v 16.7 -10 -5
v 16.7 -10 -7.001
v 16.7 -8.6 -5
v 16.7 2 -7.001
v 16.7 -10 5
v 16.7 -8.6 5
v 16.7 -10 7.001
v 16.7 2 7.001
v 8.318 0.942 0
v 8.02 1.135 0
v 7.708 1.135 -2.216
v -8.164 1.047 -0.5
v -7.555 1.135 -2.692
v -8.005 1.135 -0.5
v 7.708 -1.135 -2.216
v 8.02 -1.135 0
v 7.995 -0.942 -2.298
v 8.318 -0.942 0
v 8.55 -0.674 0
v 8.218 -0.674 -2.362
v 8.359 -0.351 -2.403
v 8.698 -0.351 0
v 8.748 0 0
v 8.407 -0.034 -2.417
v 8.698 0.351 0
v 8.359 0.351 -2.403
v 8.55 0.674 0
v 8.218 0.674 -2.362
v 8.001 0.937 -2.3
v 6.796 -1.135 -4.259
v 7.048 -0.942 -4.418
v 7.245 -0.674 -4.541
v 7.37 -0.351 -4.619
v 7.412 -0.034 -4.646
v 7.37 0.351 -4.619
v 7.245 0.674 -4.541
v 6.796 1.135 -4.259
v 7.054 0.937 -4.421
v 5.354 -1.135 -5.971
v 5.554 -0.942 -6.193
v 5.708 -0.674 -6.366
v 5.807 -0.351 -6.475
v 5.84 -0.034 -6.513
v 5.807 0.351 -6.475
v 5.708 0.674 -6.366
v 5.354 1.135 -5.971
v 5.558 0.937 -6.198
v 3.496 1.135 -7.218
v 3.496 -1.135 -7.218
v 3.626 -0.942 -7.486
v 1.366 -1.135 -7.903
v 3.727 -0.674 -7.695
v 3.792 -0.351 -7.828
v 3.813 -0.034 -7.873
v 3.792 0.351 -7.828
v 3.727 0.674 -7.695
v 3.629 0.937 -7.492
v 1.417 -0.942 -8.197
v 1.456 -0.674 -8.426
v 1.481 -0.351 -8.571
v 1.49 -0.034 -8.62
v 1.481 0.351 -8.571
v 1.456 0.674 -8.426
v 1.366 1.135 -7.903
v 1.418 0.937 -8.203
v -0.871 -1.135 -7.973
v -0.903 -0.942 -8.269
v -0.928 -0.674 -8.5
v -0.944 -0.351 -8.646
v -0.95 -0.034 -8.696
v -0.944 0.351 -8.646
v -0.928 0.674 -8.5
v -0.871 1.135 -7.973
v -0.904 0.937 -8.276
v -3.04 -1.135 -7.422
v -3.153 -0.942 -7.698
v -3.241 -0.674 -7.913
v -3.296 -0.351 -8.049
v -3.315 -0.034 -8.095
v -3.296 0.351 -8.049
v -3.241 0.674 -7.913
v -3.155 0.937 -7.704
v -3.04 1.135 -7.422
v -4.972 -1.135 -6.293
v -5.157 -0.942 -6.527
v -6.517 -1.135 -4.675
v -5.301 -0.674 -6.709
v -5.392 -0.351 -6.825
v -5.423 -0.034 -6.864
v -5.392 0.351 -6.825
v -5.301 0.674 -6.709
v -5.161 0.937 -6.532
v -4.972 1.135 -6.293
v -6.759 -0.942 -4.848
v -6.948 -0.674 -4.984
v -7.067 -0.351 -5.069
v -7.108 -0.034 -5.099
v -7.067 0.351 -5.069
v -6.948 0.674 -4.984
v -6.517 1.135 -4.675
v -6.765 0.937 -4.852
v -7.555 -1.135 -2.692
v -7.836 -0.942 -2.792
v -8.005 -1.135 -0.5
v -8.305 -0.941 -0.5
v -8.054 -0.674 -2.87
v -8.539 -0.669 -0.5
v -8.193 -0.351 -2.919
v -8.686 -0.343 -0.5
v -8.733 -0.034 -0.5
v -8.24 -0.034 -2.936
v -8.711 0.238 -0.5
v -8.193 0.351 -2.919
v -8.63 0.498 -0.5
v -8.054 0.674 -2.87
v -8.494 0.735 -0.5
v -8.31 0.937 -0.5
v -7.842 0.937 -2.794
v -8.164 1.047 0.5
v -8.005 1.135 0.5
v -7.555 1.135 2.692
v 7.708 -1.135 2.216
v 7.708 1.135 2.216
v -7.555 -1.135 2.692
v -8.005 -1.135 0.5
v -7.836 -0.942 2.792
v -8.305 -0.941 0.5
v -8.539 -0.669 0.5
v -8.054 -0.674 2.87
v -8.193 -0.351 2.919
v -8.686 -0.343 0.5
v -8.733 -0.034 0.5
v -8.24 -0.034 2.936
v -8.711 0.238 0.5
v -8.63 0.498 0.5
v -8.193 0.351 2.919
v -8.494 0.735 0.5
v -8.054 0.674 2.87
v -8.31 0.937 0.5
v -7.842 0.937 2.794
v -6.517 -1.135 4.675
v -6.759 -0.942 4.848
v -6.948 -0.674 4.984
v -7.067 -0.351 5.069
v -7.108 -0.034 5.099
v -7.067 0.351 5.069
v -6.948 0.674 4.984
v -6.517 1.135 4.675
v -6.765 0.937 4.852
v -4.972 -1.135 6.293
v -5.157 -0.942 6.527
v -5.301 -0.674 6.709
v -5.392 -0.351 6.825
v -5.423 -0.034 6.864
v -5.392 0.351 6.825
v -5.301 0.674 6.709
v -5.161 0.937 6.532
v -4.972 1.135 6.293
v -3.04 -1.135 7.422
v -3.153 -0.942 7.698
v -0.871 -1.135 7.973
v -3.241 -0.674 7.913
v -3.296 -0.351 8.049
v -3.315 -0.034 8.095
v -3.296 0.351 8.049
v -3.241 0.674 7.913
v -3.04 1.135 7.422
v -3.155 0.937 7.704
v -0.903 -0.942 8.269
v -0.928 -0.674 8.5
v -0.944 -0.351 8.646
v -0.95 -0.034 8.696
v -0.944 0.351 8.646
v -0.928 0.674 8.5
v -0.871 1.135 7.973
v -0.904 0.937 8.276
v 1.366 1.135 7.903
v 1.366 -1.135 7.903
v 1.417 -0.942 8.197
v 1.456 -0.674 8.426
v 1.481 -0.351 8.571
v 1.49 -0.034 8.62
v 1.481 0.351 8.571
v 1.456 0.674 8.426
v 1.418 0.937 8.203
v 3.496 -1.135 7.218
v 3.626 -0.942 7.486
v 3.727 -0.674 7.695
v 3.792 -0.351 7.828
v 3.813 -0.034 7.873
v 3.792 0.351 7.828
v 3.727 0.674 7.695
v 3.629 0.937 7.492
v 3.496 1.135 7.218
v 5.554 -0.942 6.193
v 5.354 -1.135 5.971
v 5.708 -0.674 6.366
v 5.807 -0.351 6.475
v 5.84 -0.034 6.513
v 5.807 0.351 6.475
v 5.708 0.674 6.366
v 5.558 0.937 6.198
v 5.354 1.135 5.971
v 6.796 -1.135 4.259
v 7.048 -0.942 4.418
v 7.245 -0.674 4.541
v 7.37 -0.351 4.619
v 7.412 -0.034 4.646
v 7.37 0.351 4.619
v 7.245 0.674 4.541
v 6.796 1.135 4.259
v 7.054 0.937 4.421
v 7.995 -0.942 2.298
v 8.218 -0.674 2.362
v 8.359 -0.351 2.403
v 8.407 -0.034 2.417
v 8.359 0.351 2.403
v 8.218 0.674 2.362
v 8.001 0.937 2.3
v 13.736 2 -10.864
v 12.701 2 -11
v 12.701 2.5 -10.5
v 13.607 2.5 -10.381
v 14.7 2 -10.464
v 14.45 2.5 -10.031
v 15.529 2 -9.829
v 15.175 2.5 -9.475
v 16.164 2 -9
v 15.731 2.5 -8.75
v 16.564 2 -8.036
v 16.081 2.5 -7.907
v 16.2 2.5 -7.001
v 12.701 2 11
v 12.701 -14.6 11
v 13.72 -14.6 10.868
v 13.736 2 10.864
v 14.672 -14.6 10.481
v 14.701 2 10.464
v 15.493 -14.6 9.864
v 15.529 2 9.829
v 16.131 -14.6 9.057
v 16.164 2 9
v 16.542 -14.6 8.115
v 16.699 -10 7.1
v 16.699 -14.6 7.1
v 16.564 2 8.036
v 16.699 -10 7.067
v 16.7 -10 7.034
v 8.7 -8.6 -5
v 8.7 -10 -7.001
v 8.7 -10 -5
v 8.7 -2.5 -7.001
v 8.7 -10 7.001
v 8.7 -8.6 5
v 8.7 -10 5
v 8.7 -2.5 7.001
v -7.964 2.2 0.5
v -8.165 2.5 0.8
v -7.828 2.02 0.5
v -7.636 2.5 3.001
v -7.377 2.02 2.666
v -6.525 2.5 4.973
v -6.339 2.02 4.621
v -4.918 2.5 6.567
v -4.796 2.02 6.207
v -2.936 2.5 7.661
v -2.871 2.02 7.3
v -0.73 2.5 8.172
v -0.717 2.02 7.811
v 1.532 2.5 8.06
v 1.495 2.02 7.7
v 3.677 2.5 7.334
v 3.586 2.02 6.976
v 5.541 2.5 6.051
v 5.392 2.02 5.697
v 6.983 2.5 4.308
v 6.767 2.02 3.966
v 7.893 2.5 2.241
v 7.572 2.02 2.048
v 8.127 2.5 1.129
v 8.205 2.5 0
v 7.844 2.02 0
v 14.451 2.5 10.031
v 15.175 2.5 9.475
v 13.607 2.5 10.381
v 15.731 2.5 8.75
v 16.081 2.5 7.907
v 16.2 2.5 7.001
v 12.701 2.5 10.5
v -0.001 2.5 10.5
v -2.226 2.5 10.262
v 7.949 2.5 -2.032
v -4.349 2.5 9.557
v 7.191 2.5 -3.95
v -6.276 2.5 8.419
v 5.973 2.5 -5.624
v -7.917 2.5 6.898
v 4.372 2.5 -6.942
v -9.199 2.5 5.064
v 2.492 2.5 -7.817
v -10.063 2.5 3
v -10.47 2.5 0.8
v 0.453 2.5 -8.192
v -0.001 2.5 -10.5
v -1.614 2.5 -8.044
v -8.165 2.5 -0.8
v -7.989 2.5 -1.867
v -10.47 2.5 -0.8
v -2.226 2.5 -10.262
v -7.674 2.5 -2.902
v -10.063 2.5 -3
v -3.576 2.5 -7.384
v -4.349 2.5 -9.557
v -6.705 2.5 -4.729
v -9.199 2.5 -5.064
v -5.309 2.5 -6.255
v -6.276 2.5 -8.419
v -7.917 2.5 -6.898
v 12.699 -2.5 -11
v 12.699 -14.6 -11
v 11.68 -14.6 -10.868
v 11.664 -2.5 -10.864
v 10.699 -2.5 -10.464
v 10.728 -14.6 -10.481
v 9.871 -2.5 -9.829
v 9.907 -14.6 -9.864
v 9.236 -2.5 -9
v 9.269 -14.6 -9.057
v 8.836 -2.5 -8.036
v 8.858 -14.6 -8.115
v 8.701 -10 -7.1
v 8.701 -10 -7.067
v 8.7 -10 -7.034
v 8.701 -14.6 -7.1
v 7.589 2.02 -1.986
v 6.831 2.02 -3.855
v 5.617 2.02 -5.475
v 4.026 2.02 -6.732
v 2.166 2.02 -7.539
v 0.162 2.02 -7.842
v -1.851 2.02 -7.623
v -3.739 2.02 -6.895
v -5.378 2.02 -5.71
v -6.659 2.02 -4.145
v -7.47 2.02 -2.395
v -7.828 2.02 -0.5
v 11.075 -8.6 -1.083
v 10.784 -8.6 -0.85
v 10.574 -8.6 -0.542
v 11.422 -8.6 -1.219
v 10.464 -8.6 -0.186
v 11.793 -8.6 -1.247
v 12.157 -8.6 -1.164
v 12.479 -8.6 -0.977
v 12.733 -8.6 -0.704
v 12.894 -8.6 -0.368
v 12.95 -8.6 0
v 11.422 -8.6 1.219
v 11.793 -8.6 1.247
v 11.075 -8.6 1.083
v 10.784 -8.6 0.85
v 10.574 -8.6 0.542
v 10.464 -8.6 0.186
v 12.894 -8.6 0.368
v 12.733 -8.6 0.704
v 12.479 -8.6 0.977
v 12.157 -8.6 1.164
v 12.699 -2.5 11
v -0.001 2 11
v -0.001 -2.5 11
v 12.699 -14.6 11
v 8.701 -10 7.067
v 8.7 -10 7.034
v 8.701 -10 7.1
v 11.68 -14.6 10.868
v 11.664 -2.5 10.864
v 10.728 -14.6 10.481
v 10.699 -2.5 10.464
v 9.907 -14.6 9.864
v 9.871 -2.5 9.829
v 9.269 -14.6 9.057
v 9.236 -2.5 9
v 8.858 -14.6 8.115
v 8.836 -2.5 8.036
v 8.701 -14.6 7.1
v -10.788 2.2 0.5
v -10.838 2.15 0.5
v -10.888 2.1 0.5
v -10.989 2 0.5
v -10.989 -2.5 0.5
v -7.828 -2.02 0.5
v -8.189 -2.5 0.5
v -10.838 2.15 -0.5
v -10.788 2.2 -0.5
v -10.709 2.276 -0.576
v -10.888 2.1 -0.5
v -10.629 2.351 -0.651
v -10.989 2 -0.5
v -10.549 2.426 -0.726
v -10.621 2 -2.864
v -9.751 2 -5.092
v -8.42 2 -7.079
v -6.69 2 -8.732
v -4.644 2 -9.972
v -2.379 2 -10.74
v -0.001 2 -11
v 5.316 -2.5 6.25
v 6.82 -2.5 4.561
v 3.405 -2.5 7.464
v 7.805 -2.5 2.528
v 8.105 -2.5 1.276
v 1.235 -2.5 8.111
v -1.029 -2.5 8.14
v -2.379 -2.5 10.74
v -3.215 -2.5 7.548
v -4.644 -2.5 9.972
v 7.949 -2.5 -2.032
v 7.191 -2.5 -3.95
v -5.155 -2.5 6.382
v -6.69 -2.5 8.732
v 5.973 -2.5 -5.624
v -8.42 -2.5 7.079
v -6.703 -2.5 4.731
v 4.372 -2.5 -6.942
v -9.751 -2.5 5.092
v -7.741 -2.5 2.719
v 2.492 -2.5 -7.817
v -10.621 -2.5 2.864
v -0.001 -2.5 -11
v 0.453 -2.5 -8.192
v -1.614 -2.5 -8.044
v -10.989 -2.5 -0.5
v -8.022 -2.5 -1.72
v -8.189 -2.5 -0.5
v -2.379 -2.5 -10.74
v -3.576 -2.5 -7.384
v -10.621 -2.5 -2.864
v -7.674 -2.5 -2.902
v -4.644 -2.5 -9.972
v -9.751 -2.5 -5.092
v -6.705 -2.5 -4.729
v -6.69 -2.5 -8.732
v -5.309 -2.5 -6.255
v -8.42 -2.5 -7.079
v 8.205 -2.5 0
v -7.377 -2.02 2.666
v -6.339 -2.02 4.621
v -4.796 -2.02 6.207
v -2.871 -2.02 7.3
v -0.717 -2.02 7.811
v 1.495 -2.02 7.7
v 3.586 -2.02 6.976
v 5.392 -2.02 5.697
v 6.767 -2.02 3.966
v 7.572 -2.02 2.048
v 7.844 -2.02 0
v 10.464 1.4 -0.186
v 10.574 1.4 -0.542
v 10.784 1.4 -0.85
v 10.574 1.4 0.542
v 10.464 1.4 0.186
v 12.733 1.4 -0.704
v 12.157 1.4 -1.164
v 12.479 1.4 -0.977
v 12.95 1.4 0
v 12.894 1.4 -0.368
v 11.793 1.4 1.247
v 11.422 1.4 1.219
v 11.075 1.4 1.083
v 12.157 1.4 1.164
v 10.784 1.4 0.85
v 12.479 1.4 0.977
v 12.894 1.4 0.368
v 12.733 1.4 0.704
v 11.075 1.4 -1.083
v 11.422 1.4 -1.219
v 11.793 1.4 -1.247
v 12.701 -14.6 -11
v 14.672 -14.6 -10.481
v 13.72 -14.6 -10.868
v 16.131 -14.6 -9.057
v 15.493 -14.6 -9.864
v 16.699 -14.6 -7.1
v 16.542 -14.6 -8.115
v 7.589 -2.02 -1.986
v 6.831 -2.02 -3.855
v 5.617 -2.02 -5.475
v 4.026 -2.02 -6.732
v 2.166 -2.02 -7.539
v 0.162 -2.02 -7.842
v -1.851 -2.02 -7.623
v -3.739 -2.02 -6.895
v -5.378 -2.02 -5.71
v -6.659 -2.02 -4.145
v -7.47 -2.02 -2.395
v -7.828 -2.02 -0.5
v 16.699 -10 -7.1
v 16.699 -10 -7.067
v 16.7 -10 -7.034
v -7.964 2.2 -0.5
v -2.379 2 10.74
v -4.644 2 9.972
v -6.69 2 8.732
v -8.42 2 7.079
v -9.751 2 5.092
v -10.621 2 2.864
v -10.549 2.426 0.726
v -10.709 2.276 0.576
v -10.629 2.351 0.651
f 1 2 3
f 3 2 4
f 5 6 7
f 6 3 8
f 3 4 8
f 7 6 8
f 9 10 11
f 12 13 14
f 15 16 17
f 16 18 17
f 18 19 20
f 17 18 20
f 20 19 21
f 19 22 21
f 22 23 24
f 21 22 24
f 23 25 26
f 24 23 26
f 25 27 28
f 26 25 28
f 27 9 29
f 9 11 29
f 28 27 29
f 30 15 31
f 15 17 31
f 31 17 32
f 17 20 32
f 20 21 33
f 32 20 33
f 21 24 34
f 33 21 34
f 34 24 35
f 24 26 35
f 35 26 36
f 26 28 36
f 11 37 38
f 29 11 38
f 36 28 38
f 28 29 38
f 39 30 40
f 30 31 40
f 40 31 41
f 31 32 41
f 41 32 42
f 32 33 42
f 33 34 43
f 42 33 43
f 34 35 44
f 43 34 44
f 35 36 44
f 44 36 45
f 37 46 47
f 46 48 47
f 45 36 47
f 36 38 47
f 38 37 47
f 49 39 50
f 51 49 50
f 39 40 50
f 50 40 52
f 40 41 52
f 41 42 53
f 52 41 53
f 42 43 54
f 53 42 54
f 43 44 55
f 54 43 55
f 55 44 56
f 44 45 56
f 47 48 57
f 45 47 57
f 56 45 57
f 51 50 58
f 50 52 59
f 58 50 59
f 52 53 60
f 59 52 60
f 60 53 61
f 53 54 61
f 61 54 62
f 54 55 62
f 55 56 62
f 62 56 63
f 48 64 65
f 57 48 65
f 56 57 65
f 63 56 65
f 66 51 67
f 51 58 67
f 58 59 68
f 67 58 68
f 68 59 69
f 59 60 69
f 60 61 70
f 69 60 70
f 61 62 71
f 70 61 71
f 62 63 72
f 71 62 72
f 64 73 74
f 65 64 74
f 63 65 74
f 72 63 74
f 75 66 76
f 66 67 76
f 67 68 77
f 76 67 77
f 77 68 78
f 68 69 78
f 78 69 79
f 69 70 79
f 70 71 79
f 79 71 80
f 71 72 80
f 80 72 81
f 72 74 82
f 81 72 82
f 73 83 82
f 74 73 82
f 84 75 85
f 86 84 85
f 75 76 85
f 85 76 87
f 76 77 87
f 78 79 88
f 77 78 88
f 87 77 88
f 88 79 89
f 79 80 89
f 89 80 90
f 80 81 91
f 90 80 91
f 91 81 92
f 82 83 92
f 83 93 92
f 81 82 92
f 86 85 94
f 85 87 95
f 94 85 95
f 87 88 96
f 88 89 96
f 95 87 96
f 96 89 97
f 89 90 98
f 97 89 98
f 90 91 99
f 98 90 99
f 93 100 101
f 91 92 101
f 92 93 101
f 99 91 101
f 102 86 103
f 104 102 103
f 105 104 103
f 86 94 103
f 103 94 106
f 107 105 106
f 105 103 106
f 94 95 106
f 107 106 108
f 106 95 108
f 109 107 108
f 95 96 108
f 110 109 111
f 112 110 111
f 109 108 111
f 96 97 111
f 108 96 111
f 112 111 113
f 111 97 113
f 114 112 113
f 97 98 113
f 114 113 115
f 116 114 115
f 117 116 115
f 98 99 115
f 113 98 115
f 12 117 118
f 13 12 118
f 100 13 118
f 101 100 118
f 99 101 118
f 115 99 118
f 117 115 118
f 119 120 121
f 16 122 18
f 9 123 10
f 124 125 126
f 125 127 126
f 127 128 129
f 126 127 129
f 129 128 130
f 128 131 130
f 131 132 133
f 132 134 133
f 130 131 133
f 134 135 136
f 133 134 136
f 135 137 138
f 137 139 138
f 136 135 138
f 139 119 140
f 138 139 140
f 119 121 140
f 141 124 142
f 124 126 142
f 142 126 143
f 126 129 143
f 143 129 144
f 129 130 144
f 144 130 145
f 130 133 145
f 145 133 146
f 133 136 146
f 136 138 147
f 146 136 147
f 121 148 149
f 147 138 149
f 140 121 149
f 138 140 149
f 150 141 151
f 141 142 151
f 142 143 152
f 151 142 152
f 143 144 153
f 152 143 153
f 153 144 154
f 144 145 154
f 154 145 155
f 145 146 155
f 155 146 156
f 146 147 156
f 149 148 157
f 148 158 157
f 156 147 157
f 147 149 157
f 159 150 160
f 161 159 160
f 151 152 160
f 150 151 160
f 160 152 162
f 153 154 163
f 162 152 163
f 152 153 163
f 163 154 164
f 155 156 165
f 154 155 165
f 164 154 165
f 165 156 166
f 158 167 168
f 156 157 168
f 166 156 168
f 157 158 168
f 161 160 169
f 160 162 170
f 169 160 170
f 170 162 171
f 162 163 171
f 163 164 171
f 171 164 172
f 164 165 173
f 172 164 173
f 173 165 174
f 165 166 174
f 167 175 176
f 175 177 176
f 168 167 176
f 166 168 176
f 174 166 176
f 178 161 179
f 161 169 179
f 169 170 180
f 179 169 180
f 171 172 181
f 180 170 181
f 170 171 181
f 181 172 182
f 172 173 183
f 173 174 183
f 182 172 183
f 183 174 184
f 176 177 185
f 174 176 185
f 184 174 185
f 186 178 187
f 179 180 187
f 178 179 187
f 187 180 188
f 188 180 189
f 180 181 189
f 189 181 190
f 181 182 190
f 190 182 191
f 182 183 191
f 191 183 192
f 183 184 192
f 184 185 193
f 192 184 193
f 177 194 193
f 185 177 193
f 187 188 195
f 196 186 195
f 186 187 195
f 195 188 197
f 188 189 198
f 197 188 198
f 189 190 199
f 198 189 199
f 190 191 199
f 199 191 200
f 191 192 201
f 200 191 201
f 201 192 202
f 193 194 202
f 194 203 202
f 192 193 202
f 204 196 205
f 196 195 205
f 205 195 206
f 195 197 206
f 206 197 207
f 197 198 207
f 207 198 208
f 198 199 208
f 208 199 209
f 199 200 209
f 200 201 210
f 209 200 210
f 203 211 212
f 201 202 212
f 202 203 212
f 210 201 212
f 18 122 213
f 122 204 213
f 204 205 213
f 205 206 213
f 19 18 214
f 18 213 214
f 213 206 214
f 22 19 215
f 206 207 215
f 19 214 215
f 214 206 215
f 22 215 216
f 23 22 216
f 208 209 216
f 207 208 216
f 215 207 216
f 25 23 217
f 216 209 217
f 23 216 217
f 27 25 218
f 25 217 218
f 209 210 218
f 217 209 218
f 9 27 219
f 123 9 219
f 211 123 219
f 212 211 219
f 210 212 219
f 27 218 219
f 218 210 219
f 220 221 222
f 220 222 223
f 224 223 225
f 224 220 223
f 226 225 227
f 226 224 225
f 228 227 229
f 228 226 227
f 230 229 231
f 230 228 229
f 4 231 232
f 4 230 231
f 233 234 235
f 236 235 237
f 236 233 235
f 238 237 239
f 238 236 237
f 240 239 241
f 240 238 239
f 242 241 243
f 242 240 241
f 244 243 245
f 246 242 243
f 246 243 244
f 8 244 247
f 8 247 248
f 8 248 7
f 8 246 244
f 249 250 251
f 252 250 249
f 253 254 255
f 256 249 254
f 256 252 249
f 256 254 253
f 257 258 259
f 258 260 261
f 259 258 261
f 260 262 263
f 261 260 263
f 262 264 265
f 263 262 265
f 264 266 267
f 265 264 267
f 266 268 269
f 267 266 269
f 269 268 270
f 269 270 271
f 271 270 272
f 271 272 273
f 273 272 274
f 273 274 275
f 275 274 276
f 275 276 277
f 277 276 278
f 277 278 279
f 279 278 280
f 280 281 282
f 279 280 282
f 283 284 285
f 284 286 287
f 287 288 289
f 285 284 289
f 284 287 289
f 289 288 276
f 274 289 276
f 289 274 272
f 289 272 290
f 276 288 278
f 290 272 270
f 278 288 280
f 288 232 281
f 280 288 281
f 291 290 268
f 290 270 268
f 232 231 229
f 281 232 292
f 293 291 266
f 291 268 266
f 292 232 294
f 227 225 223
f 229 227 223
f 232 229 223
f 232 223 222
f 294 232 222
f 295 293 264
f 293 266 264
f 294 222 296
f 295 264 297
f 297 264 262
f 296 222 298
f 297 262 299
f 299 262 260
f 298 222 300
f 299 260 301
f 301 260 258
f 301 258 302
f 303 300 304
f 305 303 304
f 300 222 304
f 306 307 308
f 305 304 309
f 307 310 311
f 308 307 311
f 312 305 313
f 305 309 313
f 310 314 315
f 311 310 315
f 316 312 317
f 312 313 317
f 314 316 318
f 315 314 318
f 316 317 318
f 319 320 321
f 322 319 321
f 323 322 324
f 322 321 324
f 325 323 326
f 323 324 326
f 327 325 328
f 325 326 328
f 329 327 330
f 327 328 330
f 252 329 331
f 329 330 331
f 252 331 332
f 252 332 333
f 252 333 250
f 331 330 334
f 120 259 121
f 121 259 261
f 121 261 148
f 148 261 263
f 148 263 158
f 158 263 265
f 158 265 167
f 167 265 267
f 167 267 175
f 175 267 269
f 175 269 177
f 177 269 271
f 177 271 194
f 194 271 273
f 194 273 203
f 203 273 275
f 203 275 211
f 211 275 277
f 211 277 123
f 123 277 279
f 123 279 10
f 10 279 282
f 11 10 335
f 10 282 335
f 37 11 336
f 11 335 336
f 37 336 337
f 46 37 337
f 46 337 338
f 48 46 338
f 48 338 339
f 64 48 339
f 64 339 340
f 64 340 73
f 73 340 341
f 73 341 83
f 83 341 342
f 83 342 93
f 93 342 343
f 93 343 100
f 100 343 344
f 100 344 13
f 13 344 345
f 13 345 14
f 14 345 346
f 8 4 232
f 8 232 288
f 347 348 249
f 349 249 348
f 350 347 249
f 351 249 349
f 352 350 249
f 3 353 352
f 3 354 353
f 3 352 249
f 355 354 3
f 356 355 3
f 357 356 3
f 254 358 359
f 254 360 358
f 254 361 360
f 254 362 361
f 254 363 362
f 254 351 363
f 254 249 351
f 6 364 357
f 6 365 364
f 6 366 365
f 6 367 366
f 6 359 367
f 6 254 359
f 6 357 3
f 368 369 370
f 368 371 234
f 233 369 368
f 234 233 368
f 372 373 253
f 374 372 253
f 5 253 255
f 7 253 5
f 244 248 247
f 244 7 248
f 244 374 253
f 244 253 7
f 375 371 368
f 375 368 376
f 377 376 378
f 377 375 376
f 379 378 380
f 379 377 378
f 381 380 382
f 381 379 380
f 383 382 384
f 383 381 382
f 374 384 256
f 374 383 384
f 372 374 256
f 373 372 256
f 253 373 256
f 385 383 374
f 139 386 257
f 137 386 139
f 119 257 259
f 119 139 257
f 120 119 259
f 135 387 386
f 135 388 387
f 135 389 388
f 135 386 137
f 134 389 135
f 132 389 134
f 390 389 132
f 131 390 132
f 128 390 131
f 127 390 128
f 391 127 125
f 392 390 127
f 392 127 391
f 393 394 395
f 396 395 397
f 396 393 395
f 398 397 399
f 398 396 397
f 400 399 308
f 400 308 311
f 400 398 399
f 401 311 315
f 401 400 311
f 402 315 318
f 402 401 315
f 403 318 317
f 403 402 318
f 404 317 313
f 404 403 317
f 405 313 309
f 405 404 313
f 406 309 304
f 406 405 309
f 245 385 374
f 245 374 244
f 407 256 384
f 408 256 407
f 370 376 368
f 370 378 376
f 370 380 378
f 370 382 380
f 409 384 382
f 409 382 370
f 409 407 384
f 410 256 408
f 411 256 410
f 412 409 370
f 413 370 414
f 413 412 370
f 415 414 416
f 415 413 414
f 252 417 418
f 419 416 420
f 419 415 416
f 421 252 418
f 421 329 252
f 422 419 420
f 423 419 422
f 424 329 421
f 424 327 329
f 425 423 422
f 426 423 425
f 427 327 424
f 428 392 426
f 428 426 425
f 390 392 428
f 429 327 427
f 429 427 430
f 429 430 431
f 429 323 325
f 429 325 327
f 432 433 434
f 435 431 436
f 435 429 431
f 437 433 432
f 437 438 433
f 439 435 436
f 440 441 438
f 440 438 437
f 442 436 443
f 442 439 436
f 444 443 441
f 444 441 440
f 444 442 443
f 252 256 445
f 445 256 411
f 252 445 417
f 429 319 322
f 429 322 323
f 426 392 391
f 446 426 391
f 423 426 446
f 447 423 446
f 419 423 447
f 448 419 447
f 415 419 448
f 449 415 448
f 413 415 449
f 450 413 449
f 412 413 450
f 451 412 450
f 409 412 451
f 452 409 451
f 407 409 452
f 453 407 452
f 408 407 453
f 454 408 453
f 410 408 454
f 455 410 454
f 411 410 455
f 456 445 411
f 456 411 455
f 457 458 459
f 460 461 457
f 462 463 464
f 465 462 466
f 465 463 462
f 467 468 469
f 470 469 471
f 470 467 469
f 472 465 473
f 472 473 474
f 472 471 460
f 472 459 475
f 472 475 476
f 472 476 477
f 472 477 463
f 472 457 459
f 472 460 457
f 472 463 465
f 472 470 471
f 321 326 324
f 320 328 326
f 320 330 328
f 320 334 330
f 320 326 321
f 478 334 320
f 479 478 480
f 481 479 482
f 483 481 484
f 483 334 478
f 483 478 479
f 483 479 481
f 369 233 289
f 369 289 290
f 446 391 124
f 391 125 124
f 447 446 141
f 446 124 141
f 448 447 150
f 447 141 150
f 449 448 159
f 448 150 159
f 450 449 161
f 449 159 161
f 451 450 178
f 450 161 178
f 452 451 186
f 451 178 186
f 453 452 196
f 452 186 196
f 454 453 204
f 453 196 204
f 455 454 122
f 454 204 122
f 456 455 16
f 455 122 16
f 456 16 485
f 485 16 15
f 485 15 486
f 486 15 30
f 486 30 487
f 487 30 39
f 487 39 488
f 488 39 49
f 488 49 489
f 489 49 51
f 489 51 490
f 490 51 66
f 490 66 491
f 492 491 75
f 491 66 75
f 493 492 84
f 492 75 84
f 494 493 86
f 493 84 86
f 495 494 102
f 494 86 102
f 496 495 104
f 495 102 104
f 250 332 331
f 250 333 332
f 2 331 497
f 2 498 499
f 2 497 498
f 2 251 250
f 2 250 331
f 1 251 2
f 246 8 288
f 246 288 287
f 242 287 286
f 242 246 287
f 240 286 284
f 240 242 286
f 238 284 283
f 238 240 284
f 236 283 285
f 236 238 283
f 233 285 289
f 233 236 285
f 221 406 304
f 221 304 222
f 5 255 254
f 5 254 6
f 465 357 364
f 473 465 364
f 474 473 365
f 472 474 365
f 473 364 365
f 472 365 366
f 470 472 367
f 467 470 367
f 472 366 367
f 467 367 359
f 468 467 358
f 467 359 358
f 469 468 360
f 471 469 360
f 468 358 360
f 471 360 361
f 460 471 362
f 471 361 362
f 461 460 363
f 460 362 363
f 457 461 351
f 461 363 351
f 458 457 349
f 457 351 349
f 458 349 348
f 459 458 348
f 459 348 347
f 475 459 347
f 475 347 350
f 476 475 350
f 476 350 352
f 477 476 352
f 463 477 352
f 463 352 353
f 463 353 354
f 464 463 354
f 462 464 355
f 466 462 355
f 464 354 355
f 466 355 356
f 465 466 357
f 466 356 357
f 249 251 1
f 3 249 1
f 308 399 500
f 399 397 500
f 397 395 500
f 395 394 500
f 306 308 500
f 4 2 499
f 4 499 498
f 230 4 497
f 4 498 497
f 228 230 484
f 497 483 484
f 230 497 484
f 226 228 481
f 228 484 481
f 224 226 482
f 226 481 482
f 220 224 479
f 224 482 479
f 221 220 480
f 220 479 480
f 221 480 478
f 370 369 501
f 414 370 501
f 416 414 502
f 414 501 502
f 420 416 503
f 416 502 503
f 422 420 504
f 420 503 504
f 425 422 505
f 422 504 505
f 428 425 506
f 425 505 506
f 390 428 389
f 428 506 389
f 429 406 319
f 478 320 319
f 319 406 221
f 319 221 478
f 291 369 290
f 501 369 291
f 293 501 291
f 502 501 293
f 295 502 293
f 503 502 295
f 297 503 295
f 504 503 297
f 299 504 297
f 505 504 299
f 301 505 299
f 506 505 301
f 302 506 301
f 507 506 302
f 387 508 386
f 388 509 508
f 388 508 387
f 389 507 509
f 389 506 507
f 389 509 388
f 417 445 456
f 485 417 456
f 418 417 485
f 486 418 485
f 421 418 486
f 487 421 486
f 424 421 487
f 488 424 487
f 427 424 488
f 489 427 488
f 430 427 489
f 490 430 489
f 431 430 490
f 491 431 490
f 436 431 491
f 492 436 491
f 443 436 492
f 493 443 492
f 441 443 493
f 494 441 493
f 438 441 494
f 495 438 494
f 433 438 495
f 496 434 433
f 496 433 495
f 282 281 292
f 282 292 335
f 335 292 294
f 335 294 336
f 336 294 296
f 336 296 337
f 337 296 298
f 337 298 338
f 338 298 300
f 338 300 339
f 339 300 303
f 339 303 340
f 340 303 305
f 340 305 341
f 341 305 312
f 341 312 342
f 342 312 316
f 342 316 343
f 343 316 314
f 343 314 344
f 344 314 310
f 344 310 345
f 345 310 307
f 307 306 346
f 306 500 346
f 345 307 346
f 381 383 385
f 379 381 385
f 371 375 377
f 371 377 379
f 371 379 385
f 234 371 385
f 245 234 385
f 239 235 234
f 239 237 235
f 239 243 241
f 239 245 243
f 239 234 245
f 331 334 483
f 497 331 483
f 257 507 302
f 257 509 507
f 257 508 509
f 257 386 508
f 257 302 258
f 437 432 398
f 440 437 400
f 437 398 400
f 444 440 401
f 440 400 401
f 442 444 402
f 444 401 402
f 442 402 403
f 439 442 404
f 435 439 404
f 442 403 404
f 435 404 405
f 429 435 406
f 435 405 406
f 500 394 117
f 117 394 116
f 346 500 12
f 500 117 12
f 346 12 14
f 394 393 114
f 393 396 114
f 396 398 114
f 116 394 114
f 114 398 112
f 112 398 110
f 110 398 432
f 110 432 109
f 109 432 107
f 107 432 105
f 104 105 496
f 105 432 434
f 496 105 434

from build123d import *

# Parameters (mm, degrees)
CHAMFER_SIZE    = 0.5
CHAMFER001_SIZE = 0.5
SKETCH001_W     = 70
SKETCH001_H     = 70
SKETCH001_W_2   = 27.7
SKETCH001_H_2   = 22
POCKET_DEPTH    = 5.001
SKETCH002_W     = 8
SKETCH002_H     = 22
PAD_DEPTH       = 12.1
SKETCH003_W     = 8
SKETCH003_H     = 14.2
POCKET001_DEPTH = 4.6
SKETCH004_W     = 8
SKETCH004_H     = 10
POCKET002_DEPTH = 1.4
SKETCH005_R     = 1.25
POCKET003_DEPTH = 10
FILLET_R        = 10.999
FILLET001_R     = 10.999
FILLET002_R     = 3.999
FILLET003_R     = 3.999
FILLET004_R     = 3.999
FILLET005_R     = 3.999
CHAMFER002_SIZE = 0.5
SKETCH006_W     = 10
SKETCH006_H     = 1
POCKET004_DEPTH = 6
CHAMFER003_SIZE = 0.3
CHAMFER004_SIZE = 0.3


with BuildPart() as part:
    # Sketch → Revolution (revolve)
    with BuildSketch(Plane.XY):
        with BuildLine():
            Line((7.704544, 2.5), (31, 2.5))
            Line((31, 2.5), (31, -2.5))
            Line((7.704544, -2.5), (31, -2.5))
            ThreePointArc((7.704544, -2.5), (7.891937, -1.824097), (8.020154, -1.134517))
            ThreePointArc((8.020154, -1.134517), (8.748074, 0), (8.020154, 1.134517))
            ThreePointArc((8.020154, 1.134517), (7.891937, 1.824097), (7.704544, 2.5))
        make_face()
    revolve(axis=Axis((0, 0, 0), (0, 1, 0)))

    # Chamfer
    chamfer_edges = [part.edges().sort_by_distance(p)[0] for p in [
        (-7.704544, -2.5, 0),
    ]]
    chamfer(chamfer_edges, length=CHAMFER_SIZE)

    # Chamfer001
    chamfer001_edges = [part.edges().sort_by_distance(p)[0] for p in [
        (-7.704544, 2.5, 0),
    ]]
    chamfer(chamfer001_edges, length=CHAMFER001_SIZE)

    # Sketch001 → Pocket (cut, through all)
    with BuildSketch(Plane.XZ.offset(2.5)):
        Rectangle(SKETCH001_W, SKETCH001_H)
        with Locations((2.85, 0)):
            Rectangle(SKETCH001_W_2, SKETCH001_H_2, mode=Mode.SUBTRACT)
    extrude(amount=-POCKET_DEPTH, mode=Mode.SUBTRACT)

    # Sketch002 → Pad (new body)
    with BuildSketch(Plane.XZ.offset(2.5)):
        with Locations((12.7, 0)):
            Rectangle(SKETCH002_W, SKETCH002_H)
    extrude(amount=PAD_DEPTH)

    # Sketch003 → Pocket001 (cut)
    with BuildSketch(Plane.XZ.offset(14.6)):
        with Locations((12.7, 0)):
            Rectangle(SKETCH003_W, SKETCH003_H)
    extrude(amount=-POCKET001_DEPTH, mode=Mode.SUBTRACT)

    # Sketch004 → Pocket002 (cut)
    with BuildSketch(Plane.XZ.offset(10)):
        with Locations((12.7, 0)):
            Rectangle(SKETCH004_W, SKETCH004_H)
    extrude(amount=-POCKET002_DEPTH, mode=Mode.SUBTRACT)

    # Sketch005 → Pocket003 (cut)
    with BuildSketch(Plane.XZ.offset(8.6)):
        with Locations((11.7, 0)):
            Circle(SKETCH005_R)
    extrude(amount=-POCKET003_DEPTH, mode=Mode.SUBTRACT)

    # Fillet
    fillet_edges = [part.edges().sort_by_distance(p)[0] for p in [
        (-11, 0, 11),
    ]]
    fillet(fillet_edges, radius=FILLET_R)

    # Fillet001
    fillet001_edges = [part.edges().sort_by_distance(p)[0] for p in [
        (-11, 0, -11),
    ]]
    fillet(fillet001_edges, radius=FILLET001_R)

    # Fillet002
    fillet002_edges = [part.edges().sort_by_distance(p)[0] for p in [
        (8.7, -8.55, -11),
    ]]
    fillet(fillet002_edges, radius=FILLET002_R)

    # Fillet003
    fillet003_edges = [part.edges().sort_by_distance(p)[0] for p in [
        (16.7, -8.55, -11),
    ]]
    fillet(fillet003_edges, radius=FILLET003_R)

    # Fillet004
    fillet004_edges = [part.edges().sort_by_distance(p)[0] for p in [
        (8.7, -8.55, 11),
    ]]
    fillet(fillet004_edges, radius=FILLET004_R)

    # Fillet005
    fillet005_edges = [part.edges().sort_by_distance(p)[0] for p in [
        (16.7, -8.55, 11),
    ]]
    fillet(fillet005_edges, radius=FILLET005_R)

    # Chamfer002
    chamfer002_edges = [part.edges().sort_by_distance(p)[0] for p in [
        (16.7, 2.5, 0),
    ]]
    chamfer(chamfer002_edges, length=CHAMFER002_SIZE)

    # Sketch006 → Pocket004 (cut)
    with BuildSketch(Plane.XZ.offset(2.5)):
        with Locations((-10, 0)):
            Rectangle(SKETCH006_W, SKETCH006_H)
    extrude(amount=-POCKET004_DEPTH, mode=Mode.SUBTRACT)

    # Chamfer003
    chamfer003_edges = [part.edges().sort_by_distance(p)[0] for p in [
        (-9.338714, 2.5, -0.5),
    ]]
    chamfer(chamfer003_edges, length=CHAMFER003_SIZE)

    # Chamfer004
    chamfer004_edges = [part.edges().sort_by_distance(p)[0] for p in [
        (-9.338714, 2.5, 0.5),
    ]]
    chamfer(chamfer004_edges, length=CHAMFER004_SIZE)


solid = part.part
